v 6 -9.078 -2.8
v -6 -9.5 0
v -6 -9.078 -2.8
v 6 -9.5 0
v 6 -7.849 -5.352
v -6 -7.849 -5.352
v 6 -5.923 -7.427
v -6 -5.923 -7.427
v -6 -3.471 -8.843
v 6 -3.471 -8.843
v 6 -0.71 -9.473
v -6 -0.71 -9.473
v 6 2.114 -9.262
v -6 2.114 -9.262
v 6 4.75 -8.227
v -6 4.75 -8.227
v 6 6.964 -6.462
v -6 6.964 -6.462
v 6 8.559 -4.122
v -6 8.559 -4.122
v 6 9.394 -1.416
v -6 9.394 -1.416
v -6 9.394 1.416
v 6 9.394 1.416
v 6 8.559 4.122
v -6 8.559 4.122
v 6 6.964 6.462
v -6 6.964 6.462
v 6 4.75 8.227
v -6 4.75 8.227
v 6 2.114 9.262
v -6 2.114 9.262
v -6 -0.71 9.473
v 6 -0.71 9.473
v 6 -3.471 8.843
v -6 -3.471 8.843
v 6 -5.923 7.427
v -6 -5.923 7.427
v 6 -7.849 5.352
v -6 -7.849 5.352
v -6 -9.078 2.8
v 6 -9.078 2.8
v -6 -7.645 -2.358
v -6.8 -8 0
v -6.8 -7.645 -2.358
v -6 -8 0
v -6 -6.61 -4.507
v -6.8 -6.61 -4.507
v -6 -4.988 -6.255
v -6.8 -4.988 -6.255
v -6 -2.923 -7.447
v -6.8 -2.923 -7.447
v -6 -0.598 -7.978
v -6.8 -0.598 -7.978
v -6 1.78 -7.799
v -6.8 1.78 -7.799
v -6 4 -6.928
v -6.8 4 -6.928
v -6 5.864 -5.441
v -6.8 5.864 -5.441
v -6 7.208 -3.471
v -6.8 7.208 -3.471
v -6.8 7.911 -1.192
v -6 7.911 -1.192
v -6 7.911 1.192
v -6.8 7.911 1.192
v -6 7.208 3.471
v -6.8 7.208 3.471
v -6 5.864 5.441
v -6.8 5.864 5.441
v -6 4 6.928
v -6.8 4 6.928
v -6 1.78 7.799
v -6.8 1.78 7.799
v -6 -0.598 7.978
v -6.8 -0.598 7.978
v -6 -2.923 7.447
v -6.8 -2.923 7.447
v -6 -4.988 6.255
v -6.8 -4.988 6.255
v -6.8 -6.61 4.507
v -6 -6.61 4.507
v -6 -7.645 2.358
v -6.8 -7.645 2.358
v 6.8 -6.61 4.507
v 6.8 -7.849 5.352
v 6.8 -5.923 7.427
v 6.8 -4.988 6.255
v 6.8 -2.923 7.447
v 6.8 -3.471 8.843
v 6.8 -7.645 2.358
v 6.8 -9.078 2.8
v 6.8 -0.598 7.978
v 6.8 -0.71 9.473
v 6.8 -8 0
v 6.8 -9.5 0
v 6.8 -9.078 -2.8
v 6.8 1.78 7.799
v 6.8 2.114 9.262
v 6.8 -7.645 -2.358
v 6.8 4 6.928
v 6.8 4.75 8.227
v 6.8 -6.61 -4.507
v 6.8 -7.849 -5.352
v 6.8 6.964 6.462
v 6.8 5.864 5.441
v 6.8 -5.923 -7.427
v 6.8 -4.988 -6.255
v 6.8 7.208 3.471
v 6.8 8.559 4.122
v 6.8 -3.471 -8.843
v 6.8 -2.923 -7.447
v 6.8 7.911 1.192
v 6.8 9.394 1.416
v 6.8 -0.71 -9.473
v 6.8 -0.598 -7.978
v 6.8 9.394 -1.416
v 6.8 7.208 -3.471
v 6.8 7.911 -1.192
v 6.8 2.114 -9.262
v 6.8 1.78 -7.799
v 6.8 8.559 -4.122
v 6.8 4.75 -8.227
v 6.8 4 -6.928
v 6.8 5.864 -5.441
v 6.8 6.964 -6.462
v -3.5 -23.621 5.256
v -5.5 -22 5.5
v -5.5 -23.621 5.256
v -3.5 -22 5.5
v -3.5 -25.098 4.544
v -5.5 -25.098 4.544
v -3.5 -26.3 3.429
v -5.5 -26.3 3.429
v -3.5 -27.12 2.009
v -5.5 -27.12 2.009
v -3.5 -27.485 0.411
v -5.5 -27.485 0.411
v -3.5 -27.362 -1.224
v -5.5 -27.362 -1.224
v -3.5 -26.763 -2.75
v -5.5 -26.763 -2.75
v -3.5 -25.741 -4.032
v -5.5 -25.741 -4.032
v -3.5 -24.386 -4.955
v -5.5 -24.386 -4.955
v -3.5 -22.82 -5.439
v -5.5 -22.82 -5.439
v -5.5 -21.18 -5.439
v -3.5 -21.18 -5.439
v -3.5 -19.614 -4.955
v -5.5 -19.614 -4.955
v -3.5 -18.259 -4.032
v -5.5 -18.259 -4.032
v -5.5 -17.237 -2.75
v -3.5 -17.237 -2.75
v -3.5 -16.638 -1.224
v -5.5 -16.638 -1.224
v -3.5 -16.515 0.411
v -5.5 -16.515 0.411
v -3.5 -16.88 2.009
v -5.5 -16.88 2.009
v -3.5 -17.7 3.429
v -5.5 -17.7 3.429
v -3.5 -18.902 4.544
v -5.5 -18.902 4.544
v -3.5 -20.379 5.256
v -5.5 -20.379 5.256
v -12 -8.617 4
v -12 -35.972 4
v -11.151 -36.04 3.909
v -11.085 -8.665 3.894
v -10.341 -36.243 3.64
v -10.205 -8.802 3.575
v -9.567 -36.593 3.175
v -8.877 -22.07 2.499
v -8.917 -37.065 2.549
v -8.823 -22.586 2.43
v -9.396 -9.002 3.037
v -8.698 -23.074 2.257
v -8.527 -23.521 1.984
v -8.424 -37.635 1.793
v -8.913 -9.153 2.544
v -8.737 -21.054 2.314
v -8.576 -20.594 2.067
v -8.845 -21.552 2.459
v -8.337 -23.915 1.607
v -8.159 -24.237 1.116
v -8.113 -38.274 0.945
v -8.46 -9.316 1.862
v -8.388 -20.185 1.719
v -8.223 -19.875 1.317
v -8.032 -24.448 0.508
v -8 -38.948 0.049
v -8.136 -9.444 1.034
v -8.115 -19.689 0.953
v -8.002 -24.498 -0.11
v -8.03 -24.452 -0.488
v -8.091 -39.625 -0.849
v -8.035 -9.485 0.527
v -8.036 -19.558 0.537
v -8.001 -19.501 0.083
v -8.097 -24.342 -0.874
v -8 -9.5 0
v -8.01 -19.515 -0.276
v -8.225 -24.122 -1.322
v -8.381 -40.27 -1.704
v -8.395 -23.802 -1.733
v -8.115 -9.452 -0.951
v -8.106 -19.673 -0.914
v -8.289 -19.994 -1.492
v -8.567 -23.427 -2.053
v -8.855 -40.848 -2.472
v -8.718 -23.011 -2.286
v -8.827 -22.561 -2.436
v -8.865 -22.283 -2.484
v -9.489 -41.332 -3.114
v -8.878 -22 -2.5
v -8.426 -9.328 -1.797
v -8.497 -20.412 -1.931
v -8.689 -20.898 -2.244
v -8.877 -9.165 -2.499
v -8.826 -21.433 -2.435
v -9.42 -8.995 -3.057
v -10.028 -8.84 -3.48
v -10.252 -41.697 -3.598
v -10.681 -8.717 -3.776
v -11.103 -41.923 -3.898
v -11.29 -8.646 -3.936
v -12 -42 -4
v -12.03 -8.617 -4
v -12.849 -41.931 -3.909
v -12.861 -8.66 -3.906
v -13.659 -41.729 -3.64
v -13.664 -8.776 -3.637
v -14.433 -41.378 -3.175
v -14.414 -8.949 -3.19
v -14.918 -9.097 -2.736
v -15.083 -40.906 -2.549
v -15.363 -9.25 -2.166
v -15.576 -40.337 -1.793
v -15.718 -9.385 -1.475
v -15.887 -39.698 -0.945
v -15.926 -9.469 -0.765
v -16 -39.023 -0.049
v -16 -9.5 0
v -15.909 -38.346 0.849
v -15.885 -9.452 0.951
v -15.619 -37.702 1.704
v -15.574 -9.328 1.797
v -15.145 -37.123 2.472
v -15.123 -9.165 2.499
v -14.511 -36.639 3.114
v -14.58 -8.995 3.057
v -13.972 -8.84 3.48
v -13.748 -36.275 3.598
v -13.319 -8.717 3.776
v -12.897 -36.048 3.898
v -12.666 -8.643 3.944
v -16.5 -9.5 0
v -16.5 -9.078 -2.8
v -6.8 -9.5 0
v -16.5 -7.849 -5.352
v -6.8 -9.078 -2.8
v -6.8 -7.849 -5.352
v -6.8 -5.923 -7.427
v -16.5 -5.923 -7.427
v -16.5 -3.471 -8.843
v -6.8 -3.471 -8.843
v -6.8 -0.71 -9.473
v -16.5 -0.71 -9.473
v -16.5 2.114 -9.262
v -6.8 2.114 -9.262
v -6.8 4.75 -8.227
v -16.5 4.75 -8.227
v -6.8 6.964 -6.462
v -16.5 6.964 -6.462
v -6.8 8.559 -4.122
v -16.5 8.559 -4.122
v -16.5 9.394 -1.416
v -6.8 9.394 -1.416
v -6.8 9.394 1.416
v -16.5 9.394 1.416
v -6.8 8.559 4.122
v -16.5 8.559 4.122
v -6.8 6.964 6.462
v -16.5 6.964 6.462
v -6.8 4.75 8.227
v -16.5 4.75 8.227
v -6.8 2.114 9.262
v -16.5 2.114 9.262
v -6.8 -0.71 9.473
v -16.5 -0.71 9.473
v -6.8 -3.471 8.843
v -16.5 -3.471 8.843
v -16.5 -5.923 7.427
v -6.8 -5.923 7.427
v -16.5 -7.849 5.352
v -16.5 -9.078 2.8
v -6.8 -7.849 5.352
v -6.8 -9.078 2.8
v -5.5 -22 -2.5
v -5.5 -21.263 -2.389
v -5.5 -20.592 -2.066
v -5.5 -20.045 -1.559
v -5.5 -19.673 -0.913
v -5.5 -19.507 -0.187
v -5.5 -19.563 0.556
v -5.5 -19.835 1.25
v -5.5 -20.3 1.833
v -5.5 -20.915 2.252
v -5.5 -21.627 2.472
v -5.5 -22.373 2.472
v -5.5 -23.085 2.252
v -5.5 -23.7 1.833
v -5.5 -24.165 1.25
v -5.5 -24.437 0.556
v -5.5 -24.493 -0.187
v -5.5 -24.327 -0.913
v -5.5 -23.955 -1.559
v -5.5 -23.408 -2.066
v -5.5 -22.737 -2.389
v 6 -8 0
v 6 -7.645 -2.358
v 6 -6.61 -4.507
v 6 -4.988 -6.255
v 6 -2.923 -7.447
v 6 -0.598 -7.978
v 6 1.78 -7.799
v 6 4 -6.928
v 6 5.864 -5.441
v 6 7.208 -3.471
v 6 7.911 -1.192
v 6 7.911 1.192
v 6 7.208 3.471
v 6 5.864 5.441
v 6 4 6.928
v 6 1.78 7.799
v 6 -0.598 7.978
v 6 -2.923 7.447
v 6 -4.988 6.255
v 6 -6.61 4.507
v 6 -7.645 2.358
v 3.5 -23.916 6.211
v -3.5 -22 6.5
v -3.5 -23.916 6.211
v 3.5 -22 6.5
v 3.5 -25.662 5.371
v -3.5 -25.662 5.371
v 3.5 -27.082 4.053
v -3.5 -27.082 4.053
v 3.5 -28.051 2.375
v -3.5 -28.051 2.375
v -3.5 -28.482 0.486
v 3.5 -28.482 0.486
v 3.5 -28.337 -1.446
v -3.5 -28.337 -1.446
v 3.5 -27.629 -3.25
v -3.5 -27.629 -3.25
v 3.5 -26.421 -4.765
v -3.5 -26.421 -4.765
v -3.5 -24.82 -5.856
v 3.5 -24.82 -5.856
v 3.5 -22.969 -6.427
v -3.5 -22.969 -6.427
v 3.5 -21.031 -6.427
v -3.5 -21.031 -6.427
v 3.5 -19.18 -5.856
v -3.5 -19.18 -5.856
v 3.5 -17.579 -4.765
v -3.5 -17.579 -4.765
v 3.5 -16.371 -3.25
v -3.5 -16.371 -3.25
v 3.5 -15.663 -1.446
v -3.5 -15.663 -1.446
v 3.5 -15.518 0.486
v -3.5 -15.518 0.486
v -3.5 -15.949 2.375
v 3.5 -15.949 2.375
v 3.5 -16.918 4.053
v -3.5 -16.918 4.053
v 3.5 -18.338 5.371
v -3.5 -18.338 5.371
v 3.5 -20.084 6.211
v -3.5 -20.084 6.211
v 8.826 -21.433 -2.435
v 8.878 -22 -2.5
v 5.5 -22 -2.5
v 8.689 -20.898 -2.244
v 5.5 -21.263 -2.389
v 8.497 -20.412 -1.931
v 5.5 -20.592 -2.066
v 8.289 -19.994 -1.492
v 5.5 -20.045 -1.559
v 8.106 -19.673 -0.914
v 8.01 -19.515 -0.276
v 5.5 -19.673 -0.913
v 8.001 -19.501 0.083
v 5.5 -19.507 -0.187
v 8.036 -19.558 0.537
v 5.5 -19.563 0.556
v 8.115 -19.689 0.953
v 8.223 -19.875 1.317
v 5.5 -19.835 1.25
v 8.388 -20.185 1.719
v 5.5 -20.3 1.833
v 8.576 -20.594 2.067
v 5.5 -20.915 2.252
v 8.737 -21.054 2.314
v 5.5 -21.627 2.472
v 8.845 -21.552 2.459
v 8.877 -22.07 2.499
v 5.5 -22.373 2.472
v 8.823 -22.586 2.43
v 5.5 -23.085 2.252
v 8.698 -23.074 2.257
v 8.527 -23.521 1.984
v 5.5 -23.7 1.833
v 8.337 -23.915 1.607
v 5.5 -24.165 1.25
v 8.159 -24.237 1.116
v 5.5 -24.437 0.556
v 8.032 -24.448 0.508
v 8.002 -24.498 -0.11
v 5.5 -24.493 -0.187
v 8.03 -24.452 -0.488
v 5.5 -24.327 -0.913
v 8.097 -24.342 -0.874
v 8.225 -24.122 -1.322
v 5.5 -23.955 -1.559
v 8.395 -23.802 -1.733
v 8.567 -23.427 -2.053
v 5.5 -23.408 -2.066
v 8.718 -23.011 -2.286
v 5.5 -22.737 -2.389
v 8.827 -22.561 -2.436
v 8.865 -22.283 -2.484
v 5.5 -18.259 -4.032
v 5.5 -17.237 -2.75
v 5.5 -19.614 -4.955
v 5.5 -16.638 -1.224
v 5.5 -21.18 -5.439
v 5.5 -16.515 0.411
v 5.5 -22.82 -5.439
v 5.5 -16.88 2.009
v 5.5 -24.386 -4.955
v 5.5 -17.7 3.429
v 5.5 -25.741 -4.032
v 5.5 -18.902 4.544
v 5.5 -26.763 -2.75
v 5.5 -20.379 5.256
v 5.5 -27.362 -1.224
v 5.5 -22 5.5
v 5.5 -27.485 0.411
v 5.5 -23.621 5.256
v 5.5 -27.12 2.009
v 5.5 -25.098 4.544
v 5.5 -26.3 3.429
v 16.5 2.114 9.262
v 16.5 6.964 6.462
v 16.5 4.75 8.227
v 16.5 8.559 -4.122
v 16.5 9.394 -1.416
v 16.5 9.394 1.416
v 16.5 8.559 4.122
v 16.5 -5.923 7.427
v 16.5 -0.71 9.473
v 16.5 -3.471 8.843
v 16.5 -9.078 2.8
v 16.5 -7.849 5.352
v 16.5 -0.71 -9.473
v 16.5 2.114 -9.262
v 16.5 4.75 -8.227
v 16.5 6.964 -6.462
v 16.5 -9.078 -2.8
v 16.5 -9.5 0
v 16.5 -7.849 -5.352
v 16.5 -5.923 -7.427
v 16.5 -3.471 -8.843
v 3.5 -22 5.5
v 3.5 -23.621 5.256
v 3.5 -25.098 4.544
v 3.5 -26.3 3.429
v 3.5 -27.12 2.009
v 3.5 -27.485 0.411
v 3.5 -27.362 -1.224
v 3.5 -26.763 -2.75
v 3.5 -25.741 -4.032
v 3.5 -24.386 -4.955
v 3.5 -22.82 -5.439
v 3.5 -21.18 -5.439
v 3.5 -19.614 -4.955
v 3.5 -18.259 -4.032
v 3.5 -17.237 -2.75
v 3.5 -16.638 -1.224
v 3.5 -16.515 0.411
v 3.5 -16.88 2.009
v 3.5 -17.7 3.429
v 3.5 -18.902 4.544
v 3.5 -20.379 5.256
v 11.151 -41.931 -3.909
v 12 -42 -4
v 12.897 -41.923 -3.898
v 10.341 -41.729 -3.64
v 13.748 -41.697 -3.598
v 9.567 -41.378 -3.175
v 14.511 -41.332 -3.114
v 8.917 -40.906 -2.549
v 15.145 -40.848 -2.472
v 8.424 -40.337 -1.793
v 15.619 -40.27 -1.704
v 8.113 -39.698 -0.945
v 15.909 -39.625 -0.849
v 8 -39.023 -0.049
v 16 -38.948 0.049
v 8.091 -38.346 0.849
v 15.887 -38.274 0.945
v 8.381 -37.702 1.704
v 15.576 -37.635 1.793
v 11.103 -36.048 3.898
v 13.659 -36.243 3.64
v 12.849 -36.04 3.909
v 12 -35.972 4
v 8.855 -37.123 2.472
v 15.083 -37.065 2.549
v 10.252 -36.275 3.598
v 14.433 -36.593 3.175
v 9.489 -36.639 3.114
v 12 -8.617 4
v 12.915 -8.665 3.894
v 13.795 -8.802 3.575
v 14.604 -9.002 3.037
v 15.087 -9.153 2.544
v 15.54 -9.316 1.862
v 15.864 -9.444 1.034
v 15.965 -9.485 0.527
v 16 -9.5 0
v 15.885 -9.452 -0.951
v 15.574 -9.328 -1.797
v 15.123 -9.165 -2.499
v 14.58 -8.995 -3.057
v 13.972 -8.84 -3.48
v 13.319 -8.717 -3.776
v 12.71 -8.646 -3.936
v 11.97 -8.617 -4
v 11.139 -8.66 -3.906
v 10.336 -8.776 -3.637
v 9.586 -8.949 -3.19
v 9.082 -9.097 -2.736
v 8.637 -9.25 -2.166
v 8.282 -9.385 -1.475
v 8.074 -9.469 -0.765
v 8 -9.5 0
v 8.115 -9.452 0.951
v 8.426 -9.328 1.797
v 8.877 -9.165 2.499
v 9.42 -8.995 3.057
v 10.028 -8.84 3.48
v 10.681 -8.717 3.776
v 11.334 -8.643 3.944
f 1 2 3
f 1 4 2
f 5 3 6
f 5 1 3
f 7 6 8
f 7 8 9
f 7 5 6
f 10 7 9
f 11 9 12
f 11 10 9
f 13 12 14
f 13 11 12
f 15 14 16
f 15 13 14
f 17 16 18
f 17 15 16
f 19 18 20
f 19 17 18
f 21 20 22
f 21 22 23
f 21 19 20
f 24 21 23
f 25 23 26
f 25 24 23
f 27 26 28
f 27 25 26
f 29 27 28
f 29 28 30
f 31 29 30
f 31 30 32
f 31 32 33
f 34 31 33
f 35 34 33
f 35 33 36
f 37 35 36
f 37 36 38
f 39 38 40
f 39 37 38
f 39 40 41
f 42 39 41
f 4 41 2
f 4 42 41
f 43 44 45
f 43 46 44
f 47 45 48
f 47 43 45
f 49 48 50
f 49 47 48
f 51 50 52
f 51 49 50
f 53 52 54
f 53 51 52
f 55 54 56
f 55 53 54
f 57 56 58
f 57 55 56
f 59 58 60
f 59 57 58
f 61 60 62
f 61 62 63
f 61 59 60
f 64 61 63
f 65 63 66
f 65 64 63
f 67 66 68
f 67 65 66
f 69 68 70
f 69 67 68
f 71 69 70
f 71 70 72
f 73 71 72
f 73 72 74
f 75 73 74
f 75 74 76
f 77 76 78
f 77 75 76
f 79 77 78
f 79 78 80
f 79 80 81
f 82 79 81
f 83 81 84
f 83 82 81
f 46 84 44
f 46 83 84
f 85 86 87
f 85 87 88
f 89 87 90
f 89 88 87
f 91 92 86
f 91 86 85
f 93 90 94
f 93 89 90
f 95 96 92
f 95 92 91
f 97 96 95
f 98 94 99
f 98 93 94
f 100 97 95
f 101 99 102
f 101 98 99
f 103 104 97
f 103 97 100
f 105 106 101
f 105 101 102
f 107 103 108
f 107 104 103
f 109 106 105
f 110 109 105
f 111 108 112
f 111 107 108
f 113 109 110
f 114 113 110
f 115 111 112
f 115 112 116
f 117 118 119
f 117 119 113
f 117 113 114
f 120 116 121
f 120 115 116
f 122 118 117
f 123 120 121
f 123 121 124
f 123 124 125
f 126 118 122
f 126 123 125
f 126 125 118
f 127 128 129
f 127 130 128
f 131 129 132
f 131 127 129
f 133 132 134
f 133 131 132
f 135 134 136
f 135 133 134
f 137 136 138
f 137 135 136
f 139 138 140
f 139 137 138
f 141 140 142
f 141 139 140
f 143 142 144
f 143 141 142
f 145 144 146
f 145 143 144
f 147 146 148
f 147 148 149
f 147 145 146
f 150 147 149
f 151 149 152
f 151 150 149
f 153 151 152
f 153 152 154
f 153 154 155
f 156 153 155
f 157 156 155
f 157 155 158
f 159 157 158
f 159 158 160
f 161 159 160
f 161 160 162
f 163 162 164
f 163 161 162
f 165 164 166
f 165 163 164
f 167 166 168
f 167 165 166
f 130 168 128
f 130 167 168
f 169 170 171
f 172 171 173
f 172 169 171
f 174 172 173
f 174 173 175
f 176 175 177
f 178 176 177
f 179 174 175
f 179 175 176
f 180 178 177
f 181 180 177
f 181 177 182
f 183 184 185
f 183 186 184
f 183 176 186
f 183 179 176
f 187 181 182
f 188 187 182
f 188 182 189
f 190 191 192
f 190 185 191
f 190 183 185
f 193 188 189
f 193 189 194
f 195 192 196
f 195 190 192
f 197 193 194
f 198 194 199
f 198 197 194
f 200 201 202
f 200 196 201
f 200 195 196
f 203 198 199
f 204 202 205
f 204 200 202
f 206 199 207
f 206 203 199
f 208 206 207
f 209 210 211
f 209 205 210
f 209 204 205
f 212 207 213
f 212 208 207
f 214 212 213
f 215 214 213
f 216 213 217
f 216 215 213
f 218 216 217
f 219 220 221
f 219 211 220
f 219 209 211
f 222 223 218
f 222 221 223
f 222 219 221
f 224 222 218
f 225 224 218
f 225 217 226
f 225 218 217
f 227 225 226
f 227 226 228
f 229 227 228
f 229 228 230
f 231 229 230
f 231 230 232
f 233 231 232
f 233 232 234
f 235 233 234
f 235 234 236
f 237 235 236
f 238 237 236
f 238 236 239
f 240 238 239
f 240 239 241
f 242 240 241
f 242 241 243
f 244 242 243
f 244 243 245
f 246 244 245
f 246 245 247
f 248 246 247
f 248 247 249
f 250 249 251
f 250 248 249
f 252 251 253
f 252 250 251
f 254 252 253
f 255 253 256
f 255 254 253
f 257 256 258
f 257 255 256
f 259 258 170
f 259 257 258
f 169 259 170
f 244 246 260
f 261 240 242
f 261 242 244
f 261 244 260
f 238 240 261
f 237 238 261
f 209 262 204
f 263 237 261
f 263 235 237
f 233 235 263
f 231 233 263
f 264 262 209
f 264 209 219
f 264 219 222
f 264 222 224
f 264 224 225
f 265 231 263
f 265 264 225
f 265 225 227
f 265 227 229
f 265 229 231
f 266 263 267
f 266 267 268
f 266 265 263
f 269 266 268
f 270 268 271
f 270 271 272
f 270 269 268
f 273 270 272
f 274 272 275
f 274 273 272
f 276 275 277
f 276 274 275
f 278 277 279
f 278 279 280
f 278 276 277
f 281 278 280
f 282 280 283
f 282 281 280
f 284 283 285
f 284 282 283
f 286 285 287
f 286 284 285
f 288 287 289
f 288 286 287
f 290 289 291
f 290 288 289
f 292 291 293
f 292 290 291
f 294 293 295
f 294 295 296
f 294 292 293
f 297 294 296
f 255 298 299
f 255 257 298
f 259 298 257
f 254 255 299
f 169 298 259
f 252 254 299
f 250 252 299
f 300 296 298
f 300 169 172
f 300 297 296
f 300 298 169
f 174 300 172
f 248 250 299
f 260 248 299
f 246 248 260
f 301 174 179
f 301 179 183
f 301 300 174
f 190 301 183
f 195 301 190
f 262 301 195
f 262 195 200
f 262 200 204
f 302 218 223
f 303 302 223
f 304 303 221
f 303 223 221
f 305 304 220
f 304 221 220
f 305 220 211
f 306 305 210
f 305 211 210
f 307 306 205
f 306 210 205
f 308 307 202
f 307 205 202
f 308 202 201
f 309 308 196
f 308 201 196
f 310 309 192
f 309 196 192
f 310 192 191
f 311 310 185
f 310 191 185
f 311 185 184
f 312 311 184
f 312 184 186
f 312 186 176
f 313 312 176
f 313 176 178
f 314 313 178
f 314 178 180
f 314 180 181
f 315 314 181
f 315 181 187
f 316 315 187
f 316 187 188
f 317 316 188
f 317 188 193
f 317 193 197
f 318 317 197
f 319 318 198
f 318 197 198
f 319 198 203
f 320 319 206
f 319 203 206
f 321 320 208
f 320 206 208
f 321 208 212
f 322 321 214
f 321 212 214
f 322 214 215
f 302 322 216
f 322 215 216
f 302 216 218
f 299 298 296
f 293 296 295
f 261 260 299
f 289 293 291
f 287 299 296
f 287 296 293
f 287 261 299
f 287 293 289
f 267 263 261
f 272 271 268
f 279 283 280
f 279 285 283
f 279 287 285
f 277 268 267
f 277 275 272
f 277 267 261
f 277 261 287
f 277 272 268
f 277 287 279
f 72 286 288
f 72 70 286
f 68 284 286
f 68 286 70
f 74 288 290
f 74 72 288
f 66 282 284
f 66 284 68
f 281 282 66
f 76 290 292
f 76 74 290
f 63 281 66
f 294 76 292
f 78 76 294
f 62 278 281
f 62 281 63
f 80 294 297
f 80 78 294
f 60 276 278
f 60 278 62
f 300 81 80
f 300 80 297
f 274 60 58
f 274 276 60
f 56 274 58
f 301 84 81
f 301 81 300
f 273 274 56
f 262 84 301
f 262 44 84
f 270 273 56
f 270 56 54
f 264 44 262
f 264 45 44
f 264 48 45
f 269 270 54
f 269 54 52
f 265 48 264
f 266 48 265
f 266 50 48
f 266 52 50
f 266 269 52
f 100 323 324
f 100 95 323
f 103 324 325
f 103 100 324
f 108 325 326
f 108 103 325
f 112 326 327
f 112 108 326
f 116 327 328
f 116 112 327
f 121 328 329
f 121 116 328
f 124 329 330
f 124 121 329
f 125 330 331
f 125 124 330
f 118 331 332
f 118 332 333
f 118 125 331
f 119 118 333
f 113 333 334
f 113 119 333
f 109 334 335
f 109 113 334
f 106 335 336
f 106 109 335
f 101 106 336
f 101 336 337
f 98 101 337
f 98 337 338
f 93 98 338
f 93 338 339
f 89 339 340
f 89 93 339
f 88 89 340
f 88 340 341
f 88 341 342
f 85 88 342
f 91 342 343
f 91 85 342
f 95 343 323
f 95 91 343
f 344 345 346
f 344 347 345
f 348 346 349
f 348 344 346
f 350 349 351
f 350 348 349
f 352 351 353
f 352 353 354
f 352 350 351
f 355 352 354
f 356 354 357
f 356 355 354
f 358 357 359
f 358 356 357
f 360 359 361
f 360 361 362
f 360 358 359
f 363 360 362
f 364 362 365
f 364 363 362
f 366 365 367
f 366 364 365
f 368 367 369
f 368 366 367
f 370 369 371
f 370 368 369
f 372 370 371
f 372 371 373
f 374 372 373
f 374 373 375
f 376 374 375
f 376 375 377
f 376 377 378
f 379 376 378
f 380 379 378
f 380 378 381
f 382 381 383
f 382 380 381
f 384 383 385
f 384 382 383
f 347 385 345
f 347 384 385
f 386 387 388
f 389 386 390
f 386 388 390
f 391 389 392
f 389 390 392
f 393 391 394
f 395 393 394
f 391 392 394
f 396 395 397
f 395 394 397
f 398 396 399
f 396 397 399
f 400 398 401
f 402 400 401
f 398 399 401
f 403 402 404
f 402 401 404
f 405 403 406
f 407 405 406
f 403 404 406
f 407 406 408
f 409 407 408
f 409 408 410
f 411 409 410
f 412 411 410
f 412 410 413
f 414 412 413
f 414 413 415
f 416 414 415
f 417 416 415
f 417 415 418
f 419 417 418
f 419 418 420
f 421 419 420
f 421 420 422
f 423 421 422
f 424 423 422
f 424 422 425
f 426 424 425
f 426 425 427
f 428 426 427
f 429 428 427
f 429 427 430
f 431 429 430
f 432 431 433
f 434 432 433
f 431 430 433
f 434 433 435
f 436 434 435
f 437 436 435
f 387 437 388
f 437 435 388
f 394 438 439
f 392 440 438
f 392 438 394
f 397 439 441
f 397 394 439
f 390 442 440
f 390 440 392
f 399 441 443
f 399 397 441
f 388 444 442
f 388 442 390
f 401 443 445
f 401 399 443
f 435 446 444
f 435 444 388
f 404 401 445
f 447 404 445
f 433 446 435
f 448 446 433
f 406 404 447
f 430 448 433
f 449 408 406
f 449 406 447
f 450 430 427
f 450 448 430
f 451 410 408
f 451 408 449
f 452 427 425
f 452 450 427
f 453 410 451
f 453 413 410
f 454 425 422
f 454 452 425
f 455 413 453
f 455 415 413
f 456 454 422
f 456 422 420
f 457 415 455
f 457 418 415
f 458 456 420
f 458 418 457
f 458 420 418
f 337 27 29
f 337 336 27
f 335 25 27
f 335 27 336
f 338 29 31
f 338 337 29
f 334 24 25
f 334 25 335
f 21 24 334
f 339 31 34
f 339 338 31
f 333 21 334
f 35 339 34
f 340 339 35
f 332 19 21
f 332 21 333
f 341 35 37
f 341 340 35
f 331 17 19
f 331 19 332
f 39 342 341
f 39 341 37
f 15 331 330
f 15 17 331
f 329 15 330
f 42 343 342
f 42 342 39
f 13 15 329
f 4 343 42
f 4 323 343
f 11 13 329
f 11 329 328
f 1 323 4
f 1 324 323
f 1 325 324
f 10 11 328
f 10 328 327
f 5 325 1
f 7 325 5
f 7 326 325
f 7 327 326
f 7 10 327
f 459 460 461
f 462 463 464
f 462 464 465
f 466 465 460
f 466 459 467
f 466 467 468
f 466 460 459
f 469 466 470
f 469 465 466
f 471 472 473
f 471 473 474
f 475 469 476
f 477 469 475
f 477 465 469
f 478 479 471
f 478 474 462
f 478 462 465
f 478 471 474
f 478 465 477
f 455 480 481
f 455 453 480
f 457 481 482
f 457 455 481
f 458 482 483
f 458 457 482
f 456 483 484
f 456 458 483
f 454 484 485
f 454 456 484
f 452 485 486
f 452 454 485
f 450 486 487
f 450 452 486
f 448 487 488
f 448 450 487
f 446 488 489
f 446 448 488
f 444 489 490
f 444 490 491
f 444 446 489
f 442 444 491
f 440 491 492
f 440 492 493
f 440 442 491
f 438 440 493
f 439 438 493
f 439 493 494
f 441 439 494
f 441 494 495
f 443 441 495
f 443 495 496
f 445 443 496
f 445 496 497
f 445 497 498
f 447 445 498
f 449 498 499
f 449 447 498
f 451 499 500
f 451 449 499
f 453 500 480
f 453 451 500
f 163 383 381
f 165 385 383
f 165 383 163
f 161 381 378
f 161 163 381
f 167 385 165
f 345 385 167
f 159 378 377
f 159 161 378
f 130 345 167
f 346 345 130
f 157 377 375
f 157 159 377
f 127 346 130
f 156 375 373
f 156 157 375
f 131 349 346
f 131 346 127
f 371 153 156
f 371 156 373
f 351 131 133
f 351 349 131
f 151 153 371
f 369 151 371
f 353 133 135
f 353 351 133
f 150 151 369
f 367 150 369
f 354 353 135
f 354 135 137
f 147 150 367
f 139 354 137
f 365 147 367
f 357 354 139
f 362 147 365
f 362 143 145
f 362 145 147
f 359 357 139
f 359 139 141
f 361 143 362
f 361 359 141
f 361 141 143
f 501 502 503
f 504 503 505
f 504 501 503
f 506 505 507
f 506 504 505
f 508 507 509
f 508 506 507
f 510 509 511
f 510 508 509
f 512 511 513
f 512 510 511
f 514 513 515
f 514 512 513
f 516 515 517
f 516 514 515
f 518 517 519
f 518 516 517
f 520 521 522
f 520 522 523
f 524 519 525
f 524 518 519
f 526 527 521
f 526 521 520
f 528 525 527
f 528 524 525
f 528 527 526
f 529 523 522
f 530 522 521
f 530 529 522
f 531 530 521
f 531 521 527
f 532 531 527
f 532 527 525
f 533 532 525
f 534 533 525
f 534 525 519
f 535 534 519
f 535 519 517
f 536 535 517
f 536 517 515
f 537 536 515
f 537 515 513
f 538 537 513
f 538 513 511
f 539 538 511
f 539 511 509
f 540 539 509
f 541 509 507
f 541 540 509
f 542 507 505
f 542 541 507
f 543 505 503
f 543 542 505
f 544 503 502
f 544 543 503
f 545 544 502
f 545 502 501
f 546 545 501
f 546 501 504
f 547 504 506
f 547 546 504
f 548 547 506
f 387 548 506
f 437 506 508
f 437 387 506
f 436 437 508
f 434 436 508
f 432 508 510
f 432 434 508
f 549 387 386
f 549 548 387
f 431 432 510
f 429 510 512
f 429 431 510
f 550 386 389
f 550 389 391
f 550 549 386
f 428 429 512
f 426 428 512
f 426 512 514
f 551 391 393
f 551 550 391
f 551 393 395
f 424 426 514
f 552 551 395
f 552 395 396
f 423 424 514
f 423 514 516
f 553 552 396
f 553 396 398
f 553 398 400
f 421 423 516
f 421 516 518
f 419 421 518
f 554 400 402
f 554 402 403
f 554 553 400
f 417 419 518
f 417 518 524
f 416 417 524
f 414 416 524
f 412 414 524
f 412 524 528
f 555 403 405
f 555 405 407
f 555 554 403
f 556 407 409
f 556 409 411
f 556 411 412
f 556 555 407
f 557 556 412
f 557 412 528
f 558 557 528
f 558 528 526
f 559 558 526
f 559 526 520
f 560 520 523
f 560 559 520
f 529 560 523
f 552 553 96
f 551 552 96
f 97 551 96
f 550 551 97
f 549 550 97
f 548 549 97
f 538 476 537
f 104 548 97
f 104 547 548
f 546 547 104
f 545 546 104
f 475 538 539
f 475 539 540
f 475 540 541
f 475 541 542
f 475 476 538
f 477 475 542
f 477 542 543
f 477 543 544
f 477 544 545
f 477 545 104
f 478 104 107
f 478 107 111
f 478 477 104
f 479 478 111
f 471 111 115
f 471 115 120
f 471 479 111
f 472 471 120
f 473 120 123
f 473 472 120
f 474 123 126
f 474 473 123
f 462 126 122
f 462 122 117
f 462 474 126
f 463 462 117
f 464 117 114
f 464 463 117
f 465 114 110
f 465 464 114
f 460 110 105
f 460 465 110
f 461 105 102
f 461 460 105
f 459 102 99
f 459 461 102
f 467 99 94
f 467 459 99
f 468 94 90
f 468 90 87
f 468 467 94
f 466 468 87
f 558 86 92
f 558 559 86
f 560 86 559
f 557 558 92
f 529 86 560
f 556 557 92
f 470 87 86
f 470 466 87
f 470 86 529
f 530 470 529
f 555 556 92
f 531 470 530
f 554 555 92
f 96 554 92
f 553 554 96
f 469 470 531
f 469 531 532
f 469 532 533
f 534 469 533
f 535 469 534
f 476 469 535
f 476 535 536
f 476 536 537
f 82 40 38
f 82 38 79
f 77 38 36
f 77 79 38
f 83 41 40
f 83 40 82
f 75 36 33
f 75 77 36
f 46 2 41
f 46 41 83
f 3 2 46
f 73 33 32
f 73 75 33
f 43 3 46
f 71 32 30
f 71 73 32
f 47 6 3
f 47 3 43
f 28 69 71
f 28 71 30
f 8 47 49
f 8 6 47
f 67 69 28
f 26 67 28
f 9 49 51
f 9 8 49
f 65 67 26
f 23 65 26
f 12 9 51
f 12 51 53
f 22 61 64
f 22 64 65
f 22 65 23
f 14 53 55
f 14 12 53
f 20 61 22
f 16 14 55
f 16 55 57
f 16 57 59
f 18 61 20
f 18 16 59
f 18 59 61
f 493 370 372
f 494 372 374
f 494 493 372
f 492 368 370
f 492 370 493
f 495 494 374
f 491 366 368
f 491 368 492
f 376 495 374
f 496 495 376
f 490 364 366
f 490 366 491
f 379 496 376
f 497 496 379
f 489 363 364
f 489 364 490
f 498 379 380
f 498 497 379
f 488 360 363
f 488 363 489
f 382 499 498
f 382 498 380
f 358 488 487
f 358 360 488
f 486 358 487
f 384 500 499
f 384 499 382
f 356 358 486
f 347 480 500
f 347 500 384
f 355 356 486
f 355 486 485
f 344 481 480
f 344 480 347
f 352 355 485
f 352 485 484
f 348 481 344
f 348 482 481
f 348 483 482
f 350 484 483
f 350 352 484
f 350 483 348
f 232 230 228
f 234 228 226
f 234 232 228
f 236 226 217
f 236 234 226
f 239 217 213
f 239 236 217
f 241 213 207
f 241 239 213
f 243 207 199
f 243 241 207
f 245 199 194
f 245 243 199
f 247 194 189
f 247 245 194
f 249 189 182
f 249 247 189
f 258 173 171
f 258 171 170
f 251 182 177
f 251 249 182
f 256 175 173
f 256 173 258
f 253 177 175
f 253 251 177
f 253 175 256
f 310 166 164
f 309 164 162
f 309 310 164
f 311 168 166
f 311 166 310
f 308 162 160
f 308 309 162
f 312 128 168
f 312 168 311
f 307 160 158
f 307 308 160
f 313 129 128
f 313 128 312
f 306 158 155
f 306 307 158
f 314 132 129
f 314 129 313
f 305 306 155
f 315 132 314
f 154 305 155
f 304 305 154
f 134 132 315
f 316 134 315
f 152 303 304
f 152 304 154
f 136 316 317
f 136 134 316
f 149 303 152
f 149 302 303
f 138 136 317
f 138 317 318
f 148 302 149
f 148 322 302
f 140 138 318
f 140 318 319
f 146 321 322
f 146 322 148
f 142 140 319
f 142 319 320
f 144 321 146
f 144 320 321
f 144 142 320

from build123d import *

# Parameters (mm, degrees)
SKETCH_5_R               = 4
EXTRUDE_3_DEPTH          = 42
CUT_EXTRUDE_2_DEPTH      = 47.113989348
CUT_EXTRUDE_2_DEPTH_BACK = 47.113989348
EXTRUDE_4_DEPTH          = 12
EXTRUDE_4_DEPTH_BACK     = 12
SKETCH_7_R               = 2.5


with BuildPart() as part:
    # Эскиз4 → Повернуть1 (revolve)
    with BuildSketch(Plane.XY, mode=Mode.PRIVATE) as revolve_1_sk:
        Polygon((-16.5, 0), (-16.5, 9.5), (-6.8, 9.5), (-6.8, 8), (-6, 8), (-6, 9.5), (6, 9.5), (6, 8), (6.8, 8), (6.8, 9.5), (16.5, 9.5), (16.5, 0), align=None)
    revolve(revolve_1_sk.sketch.rotate(Axis((-16.5, 0, 0), (1, 0, 0)), 180), axis=Axis((-16.5, 0, 0), (1, 0, 0)))

    # Эскиз5 → Бобышка-Вытянуть3 (add)
    with BuildSketch(Plane(origin=(0, 0, 0), x_dir=(1, 0, 0), z_dir=(0, 1, 0))):
        with Locations(Location((-12, 0, 0), (0, 0, 270))):
            Circle(SKETCH_5_R)
        with Locations(Location((12, 0, 0), (0, 0, 270))):
            Circle(SKETCH_5_R)
    extrude(amount=-EXTRUDE_3_DEPTH)

    # Эскиз6 → Вырез-Вытянуть2 (cut, two sides: drawn at the far end of the back side and taken through both)
    with BuildSketch(Plane(origin=(0, 0, 0), x_dir=(0, 0, -1), z_dir=(1, 0, 0)).offset(-CUT_EXTRUDE_2_DEPTH_BACK)):
        Polygon((4, -42), (-4, -35.971567599), (-4, -42), align=None)
    extrude(amount=CUT_EXTRUDE_2_DEPTH + CUT_EXTRUDE_2_DEPTH_BACK, mode=Mode.SUBTRACT)

    # Эскиз7 → Бобышка-Вытянуть4 (add, two sides: drawn at the far end of the back side and taken through both)
    with BuildSketch(Plane(origin=(0, 0, 0), x_dir=(0, 0, -1), z_dir=(1, 0, 0)).offset(-EXTRUDE_4_DEPTH_BACK)):
        with Locations((0, -22)):
            Circle(SKETCH_7_R)
    extrude(amount=EXTRUDE_4_DEPTH + EXTRUDE_4_DEPTH_BACK)

    # Эскиз8 → Повернуть2 (revolve)
    with BuildSketch(Plane.XY, mode=Mode.PRIVATE) as revolve_2_sk:
        Polygon((-5.5, -22), (-5.5, -16.5), (-3.5, -16.5), (-3.5, -15.5), (3.5, -15.5), (3.5, -16.5), (5.5, -16.5), (5.5, -22), align=None)
    revolve(revolve_2_sk.sketch.rotate(Axis((-20.226487352, -22, 0), (1, 0, 0)), 90), axis=Axis((-20.226487352, -22, 0), (1, 0, 0)))


solid = part.part
